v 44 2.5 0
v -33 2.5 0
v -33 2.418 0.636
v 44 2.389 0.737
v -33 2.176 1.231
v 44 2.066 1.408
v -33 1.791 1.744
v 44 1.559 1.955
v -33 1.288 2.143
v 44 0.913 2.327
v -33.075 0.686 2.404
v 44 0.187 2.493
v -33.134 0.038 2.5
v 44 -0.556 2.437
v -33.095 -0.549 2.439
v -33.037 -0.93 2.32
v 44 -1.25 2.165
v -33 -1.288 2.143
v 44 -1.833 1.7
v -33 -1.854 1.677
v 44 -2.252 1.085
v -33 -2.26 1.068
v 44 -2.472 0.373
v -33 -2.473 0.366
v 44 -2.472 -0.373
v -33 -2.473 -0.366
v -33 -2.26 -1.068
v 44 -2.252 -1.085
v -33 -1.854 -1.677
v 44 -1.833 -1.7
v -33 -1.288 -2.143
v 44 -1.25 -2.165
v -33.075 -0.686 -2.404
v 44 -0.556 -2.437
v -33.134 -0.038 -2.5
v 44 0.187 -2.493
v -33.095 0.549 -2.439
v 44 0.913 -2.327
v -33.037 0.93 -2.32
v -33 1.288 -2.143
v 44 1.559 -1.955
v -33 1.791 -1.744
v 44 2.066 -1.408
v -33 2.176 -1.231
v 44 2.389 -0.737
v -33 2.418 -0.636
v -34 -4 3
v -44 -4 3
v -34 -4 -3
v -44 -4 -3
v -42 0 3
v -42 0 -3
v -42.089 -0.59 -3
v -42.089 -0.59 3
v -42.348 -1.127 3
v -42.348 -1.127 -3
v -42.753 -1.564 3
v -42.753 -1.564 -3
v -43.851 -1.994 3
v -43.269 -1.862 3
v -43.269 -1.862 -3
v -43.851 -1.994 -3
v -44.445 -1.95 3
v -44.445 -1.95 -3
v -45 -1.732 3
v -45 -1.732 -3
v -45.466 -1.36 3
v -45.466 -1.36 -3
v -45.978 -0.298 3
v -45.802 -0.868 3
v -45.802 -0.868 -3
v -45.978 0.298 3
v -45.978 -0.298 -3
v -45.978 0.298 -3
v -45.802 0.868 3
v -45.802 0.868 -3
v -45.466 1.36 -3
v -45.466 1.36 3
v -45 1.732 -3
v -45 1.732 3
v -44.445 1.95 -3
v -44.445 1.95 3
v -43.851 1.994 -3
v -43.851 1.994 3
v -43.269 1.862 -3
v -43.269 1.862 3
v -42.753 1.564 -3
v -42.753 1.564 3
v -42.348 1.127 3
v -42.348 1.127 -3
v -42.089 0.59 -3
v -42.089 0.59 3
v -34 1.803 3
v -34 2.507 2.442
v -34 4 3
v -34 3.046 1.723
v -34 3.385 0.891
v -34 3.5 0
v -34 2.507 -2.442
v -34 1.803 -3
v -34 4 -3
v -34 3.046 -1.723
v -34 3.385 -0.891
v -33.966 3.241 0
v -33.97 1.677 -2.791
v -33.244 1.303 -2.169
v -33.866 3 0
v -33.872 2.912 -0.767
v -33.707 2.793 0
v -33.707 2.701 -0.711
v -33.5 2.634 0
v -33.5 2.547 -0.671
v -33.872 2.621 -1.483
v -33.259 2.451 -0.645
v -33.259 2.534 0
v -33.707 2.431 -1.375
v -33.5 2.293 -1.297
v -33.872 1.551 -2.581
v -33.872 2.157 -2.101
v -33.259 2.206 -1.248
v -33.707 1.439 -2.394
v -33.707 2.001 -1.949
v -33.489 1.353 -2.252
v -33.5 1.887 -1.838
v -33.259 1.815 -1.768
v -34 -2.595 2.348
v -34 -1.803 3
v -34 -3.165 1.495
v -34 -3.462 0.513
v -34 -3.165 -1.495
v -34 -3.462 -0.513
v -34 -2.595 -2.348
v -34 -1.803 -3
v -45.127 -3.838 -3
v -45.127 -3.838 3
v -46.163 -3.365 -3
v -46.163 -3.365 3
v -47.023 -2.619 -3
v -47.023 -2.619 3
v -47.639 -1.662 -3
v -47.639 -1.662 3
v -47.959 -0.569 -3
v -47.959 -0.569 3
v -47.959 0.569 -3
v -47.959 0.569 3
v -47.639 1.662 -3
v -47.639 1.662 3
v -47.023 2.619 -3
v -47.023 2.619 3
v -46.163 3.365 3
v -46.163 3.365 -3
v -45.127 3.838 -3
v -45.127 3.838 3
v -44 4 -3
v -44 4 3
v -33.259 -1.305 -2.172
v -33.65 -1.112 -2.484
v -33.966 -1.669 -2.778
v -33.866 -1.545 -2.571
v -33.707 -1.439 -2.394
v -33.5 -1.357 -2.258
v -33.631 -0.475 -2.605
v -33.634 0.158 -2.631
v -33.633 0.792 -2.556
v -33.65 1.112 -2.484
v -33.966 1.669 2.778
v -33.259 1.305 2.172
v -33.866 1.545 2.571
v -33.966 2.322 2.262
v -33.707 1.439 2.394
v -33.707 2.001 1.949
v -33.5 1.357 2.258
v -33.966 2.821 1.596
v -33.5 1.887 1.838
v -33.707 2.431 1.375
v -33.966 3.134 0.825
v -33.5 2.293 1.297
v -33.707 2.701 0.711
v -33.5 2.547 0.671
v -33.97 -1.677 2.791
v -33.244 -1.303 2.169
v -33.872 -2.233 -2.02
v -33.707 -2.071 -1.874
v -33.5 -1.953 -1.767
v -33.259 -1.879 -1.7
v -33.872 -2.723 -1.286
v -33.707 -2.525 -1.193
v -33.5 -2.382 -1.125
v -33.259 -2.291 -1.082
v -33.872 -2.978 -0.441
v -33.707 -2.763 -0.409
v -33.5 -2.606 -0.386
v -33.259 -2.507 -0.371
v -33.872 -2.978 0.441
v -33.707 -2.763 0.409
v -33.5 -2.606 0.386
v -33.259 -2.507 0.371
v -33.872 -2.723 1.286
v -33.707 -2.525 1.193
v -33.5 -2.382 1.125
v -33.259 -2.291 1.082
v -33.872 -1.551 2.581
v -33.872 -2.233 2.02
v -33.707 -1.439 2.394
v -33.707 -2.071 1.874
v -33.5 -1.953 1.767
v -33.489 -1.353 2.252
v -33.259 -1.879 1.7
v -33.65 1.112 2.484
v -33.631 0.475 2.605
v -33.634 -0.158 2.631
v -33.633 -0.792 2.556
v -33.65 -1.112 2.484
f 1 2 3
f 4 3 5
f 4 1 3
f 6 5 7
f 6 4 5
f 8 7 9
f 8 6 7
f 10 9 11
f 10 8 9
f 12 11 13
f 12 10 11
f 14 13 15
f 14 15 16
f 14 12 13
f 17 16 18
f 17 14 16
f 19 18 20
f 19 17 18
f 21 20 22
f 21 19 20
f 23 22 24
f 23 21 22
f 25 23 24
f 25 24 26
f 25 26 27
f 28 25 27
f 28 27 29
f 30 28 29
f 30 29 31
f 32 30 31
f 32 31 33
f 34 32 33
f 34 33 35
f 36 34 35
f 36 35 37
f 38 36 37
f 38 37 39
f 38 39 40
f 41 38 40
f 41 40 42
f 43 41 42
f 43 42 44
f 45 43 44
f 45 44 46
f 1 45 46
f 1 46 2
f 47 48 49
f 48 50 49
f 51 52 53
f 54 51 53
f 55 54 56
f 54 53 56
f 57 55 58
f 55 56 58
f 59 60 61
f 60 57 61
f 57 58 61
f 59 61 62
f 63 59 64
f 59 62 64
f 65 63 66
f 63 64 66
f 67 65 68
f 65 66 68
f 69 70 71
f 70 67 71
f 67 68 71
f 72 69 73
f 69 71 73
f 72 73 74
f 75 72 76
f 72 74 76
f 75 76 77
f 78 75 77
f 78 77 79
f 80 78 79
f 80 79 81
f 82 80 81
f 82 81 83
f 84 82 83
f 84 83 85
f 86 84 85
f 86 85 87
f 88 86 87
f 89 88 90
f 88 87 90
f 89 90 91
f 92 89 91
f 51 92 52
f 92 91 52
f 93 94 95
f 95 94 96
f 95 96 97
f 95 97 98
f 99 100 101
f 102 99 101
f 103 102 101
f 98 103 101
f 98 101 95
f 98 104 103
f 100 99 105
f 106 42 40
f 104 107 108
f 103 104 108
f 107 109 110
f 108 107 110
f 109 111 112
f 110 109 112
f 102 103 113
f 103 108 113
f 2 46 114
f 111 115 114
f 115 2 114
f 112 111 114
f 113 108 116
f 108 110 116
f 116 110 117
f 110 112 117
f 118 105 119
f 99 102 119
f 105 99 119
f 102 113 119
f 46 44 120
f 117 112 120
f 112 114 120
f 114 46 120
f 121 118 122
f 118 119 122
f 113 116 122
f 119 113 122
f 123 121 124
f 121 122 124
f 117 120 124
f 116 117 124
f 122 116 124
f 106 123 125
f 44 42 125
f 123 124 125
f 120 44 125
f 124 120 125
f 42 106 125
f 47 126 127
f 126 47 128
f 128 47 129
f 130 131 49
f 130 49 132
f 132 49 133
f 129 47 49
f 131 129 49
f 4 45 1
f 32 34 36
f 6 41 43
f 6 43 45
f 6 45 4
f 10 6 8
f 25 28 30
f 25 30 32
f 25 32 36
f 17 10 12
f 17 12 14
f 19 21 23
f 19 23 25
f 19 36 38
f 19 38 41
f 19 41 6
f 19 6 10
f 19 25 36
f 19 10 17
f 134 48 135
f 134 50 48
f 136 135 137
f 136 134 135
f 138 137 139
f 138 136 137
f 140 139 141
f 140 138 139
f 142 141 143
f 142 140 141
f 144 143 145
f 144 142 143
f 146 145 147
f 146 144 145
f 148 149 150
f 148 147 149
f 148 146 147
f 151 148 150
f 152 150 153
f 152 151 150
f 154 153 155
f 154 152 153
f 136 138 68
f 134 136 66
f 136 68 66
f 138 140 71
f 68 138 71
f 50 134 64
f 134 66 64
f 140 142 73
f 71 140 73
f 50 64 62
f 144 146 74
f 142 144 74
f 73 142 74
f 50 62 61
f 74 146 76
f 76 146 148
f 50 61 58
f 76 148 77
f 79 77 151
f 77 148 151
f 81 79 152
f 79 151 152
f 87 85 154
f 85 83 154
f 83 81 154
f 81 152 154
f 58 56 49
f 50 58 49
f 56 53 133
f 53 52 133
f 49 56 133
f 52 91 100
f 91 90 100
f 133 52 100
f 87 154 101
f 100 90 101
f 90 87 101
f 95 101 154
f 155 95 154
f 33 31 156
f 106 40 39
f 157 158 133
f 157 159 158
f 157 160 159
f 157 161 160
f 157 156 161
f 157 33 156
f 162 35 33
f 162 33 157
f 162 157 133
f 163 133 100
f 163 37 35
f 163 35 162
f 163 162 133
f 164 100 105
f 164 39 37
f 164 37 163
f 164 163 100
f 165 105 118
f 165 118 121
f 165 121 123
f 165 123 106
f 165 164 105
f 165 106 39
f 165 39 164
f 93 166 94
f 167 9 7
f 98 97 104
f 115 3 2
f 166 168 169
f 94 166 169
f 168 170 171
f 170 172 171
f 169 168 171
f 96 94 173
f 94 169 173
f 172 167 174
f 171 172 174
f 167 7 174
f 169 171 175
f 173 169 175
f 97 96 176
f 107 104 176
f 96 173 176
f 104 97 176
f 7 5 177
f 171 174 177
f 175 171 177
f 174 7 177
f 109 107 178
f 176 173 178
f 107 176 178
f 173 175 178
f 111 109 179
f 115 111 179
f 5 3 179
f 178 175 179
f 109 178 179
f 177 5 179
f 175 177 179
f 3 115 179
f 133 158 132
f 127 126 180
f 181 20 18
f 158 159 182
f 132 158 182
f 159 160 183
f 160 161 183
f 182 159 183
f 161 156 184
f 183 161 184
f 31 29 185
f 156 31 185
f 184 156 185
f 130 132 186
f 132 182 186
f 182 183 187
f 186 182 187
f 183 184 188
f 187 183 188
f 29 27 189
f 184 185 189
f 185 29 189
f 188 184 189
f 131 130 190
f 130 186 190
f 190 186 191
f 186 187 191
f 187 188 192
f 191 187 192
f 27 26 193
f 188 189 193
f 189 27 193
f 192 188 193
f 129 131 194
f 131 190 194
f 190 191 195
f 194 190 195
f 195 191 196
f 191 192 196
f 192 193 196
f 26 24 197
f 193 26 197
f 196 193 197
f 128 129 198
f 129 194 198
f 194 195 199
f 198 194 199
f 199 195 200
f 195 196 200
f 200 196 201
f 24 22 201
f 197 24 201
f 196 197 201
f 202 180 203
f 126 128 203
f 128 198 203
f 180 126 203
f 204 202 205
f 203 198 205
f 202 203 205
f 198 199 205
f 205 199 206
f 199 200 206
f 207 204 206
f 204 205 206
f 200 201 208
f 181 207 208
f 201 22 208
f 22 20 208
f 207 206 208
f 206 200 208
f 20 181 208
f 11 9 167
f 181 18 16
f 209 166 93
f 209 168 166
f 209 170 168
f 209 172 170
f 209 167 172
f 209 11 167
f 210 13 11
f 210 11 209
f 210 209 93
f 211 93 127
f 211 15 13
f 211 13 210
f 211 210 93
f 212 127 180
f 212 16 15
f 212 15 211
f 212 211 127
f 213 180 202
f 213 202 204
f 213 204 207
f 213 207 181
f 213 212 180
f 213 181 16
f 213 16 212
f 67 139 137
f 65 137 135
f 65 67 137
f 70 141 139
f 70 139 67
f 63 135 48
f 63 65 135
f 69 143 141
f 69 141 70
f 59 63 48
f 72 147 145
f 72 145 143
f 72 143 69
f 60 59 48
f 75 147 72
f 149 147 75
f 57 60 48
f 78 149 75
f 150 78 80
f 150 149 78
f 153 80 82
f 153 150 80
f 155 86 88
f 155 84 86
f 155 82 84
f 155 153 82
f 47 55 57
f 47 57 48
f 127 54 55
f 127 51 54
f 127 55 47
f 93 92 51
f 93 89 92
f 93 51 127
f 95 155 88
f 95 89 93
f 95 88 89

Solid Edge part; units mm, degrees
sketch "Sketch1" plane through (0, 0, 0) normal (1, 0, 0) x (0, 1, 0)
  circle A0 centre (0, 0) radius 2.5
extrude "Protrusion1" add sketch "Sketch1" along normal blind 44
sketch "Sketch2" plane through (0, 0, 0) normal (1, 0, 0) x (0, 1, 0)
  circle A0 centre (0, 0) radius 2.5
extrude "ExtrudedProtrusion_2" add sketch "Sketch2" against normal blind 34
sketch "Sketch3" plane through (0, 0, 0) normal (0, 0, 1) x (1, 0, 0)
  line L0 (-44, -4) -> (-34, -4)
  line L1 (-34, -4) -> (-34, 4)
  line L2 (-34, 4) -> (-44, 4)
  arc A0 (-44, 4) -> (-44, -4) centre (-44, 0) ccw
  circle A1 centre (-44, 0) radius 2
extrude "ExtrudedProtrusion_3" add sketch "Sketch3" along normal mid plane 6
fillet "Round_1" radius 1 1 edges at (-34, -2.5, 0)
cosmetic_thread "Thread_1" size "M5" thread depth 14
